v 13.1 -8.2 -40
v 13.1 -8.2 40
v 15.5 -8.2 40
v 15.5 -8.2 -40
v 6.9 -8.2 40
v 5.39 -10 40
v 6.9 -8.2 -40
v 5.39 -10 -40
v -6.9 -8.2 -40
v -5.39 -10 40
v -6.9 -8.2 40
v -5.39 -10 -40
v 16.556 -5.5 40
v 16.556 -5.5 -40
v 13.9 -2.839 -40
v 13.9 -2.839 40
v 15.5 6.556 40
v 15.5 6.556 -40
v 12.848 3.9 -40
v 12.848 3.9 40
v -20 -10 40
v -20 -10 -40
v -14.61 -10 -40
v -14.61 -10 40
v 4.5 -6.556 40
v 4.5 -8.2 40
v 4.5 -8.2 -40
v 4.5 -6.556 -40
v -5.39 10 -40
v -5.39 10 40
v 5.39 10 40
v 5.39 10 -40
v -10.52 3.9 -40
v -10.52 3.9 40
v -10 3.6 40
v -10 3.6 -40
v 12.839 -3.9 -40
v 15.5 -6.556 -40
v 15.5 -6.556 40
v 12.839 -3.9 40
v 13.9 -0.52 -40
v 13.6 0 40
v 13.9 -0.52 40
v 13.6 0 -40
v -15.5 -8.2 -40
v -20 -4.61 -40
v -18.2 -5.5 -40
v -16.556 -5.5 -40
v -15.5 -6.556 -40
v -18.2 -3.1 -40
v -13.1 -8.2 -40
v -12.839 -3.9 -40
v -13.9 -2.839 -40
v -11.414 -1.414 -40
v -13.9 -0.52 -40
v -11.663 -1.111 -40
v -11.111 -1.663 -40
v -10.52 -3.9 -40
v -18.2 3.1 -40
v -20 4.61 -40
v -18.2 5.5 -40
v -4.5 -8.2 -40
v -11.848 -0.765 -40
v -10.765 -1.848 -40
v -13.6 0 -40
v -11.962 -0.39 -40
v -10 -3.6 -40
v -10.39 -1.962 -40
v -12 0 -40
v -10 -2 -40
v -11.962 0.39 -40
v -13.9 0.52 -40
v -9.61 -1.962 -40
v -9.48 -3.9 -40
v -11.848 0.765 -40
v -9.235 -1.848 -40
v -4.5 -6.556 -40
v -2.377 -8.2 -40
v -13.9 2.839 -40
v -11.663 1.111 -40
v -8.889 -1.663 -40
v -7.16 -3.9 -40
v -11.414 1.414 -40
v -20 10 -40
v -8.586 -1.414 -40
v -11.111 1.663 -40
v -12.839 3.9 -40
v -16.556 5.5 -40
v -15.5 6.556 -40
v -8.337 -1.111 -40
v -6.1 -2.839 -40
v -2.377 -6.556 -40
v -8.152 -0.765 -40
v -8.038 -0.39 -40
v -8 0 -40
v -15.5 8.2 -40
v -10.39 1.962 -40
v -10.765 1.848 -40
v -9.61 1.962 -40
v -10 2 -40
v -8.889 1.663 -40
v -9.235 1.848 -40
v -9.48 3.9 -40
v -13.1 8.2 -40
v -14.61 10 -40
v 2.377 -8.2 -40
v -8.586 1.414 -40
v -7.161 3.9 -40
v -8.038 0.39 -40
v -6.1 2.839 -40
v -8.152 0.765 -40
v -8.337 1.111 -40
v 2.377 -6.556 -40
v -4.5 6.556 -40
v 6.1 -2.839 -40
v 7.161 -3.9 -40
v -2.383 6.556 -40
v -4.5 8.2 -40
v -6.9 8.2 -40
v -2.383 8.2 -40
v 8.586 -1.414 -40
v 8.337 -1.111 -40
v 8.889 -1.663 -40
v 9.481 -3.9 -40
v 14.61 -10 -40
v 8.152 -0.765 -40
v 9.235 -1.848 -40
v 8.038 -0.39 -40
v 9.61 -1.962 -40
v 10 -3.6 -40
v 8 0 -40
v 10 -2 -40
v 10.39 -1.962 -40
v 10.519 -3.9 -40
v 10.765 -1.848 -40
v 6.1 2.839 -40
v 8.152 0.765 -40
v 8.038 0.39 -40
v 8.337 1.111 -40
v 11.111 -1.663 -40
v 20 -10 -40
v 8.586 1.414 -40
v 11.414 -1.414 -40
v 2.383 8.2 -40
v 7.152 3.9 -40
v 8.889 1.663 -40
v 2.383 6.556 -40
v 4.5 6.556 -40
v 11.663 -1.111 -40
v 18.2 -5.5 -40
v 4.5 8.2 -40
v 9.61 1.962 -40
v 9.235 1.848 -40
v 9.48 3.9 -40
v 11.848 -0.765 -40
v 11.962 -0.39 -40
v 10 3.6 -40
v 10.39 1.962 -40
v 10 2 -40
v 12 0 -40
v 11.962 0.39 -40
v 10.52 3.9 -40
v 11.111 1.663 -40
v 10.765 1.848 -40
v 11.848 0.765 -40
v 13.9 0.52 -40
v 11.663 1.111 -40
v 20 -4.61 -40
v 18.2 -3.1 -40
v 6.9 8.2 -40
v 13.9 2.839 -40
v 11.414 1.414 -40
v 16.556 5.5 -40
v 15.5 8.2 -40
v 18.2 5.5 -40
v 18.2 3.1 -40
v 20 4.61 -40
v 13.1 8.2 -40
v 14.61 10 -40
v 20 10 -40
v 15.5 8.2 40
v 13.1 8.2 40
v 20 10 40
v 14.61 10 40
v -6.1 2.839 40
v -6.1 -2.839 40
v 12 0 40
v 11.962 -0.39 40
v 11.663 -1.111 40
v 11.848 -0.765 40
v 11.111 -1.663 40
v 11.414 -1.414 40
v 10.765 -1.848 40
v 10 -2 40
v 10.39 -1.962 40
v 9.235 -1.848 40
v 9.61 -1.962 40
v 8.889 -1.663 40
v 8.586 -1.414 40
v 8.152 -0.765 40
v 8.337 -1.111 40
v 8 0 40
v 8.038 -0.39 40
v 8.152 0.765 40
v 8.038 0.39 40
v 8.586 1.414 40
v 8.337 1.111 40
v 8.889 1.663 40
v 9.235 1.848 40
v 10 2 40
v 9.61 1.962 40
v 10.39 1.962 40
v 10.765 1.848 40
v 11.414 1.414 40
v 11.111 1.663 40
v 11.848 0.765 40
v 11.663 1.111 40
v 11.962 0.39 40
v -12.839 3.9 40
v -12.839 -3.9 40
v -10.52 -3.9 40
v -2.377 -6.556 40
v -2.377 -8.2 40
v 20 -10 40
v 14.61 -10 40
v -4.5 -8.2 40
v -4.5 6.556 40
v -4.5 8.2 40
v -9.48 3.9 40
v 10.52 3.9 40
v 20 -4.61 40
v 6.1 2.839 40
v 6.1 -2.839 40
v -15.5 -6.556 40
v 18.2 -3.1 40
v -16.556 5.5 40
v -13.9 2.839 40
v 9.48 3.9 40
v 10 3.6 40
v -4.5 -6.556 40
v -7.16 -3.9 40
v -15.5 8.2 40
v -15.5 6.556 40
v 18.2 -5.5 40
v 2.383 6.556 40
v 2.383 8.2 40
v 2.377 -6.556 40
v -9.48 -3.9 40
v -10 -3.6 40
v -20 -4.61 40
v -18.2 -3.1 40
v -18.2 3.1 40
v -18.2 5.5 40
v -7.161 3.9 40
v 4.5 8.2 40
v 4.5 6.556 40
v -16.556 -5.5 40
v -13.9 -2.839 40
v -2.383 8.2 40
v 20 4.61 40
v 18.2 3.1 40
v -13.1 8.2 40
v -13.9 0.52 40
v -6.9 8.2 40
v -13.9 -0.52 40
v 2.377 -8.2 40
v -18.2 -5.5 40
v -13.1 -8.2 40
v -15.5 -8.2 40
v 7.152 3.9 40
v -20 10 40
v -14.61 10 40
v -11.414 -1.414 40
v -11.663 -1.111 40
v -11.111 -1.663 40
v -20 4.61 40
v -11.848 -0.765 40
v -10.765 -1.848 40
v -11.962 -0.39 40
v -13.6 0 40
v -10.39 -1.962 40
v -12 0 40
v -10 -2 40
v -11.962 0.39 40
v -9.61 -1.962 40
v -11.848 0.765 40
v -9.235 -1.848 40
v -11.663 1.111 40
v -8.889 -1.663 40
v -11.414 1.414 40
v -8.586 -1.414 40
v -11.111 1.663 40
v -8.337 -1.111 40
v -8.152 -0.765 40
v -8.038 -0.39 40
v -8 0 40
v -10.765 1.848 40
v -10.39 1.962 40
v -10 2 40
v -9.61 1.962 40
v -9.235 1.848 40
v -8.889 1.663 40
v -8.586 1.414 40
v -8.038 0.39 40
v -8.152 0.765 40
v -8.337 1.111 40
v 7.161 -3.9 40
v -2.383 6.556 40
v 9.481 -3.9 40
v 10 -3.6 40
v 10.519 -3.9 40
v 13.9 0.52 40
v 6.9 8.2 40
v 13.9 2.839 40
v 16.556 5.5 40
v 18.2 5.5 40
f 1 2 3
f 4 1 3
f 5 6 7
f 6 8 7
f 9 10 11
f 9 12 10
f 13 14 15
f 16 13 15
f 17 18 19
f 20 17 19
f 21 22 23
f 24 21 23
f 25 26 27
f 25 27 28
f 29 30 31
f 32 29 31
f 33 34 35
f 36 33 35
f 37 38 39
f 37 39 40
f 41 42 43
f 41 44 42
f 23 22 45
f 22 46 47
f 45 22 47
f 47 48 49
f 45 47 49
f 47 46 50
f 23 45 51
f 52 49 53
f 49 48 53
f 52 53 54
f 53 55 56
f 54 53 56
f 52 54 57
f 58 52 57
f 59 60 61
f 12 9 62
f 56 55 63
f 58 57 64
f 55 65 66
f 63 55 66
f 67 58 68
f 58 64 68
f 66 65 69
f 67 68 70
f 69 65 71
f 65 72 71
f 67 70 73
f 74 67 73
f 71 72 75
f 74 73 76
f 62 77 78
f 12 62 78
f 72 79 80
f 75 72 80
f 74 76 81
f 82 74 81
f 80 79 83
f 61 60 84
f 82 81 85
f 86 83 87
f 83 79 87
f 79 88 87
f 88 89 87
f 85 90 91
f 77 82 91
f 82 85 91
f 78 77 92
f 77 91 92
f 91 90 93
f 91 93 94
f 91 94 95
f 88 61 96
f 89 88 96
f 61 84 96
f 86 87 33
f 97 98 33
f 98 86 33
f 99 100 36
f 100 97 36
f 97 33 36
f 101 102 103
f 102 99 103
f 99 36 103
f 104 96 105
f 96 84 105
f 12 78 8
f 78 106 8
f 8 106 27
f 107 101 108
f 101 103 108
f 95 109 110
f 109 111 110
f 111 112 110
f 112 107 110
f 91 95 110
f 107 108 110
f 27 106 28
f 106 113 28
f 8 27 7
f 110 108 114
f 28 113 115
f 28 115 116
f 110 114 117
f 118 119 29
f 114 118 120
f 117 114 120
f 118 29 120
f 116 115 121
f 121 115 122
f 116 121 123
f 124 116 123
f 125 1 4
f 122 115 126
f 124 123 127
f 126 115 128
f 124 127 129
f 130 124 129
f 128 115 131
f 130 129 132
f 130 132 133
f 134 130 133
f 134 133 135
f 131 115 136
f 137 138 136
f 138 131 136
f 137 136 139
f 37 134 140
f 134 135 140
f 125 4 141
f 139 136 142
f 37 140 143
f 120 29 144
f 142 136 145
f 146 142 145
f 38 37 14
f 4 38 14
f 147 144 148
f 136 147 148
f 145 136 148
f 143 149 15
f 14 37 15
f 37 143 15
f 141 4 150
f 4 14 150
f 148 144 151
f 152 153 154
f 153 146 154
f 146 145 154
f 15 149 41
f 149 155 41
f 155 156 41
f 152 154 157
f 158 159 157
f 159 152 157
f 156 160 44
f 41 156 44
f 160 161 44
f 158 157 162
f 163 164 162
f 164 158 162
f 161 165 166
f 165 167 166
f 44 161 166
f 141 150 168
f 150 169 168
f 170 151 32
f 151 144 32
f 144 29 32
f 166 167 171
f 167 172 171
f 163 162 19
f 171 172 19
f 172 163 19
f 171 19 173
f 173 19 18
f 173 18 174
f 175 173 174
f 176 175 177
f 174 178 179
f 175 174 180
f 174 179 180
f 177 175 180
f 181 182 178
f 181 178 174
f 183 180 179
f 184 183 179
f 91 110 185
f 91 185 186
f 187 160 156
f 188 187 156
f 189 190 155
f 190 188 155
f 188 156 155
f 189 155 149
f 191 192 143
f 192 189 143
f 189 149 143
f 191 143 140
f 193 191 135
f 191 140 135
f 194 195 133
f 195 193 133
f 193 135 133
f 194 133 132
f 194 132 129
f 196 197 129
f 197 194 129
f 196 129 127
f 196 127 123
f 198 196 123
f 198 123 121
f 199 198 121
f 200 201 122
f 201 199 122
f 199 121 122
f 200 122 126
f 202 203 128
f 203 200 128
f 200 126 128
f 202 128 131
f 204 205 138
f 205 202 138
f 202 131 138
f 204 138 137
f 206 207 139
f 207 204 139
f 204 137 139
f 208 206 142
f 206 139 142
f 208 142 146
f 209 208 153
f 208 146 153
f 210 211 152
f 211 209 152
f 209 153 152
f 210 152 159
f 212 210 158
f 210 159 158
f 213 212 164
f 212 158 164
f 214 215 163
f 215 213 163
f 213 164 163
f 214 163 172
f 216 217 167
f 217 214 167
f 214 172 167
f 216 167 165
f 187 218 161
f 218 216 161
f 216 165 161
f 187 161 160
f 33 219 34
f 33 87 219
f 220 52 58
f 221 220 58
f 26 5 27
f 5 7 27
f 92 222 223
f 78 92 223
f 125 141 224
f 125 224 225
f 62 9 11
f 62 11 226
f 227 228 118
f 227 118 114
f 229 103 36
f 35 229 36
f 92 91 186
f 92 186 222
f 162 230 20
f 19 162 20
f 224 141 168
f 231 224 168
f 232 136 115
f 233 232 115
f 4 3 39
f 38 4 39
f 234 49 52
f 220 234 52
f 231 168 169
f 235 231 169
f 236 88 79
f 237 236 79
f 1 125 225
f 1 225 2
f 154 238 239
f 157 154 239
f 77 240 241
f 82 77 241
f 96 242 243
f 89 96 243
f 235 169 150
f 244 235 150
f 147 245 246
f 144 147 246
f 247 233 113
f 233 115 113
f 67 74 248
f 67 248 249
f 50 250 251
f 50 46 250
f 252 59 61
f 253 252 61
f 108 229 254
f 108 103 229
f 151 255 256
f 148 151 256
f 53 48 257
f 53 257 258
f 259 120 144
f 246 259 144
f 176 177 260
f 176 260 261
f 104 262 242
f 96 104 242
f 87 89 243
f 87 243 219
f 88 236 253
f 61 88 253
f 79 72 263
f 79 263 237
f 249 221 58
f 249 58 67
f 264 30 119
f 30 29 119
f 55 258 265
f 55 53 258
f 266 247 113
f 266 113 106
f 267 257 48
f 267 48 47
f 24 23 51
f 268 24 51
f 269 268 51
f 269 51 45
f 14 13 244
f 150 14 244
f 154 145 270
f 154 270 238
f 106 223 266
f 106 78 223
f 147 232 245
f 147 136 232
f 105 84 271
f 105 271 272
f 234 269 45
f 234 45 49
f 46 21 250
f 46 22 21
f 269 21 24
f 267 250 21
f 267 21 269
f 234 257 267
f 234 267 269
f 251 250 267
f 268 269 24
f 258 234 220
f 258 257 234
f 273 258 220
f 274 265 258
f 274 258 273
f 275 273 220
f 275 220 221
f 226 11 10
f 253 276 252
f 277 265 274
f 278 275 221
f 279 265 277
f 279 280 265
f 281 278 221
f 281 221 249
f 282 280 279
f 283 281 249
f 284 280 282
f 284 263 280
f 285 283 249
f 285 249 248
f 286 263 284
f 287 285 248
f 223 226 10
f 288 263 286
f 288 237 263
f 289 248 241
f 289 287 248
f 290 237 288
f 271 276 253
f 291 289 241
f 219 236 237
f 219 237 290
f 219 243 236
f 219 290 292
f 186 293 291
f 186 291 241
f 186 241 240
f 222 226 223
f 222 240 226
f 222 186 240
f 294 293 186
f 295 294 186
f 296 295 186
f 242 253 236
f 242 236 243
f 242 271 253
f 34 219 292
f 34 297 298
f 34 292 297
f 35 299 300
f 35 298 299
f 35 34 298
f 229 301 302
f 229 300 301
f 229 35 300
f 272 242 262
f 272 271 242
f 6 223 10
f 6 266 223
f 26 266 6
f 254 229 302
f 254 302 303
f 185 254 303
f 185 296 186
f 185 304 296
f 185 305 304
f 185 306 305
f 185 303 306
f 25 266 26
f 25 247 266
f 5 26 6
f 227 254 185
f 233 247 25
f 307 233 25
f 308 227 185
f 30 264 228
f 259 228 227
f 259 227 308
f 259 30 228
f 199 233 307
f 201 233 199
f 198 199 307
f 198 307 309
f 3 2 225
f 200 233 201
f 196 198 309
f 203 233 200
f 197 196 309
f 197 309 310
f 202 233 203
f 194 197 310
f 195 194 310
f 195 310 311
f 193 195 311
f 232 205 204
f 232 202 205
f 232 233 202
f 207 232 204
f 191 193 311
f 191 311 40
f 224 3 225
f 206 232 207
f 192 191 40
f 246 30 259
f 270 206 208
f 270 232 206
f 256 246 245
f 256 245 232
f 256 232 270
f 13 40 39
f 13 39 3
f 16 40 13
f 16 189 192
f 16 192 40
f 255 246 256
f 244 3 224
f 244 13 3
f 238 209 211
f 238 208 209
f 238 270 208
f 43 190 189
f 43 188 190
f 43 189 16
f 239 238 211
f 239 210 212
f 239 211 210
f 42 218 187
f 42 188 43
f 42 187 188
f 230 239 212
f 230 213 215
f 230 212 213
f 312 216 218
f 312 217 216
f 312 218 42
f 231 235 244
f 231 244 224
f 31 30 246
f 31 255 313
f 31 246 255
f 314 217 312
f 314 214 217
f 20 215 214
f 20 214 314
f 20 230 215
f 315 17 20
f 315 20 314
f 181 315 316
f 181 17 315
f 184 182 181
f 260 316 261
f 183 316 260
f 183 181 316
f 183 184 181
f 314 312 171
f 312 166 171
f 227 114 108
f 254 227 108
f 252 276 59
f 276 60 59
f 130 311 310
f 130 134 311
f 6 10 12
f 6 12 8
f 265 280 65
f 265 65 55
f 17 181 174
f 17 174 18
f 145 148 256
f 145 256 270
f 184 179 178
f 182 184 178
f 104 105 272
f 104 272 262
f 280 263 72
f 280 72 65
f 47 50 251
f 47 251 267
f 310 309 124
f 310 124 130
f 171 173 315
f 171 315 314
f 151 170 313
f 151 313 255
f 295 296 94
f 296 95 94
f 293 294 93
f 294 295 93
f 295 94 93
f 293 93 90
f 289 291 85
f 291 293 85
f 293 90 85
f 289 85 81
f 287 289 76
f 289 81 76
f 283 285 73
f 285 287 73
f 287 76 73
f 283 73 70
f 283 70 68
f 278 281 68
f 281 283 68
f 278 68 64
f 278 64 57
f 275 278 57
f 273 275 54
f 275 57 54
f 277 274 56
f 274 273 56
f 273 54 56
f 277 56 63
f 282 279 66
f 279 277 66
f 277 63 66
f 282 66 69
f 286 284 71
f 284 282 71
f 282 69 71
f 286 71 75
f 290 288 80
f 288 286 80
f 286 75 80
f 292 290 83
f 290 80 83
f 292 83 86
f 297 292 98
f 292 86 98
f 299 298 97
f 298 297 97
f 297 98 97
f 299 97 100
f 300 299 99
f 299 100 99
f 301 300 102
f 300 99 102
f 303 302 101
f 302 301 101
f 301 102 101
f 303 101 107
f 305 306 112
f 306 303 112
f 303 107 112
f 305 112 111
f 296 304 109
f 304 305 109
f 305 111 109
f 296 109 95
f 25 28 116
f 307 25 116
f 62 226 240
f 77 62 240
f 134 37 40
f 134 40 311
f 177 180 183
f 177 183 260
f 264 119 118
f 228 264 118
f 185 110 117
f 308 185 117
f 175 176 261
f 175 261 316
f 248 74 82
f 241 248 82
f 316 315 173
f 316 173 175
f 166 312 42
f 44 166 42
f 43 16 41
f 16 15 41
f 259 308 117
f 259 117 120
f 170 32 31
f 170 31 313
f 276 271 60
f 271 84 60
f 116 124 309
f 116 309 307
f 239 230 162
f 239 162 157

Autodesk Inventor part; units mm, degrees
ref_plane "YZ Plane" through (0, 0, 0) normal (1, 0, 0) x (0, 1, 0)
ref_plane "XZ Plane" through (0, 0, 0) normal (0, 1, 0) x (-1, 0, 0)
ref_plane "XY Plane" through (0, 0, 0) normal (0, 0, 1) x (1, 0, 0)
sketch "Sketch1" plane through (0, 0, 0) normal (0, 0, 1) x (1, 0, 0)
  line L0 (4.5, 8.2) -> (4.5, 6.5562)
  line L1 (6.9, 8.2) -> (4.5, 8.2)
  line L2 (5.3896, 10) -> (6.9, 8.2)
  line L3 (-5.3896, 10) -> (5.3896, 10)
  line L4 (-5.3896, 10) -> (-6.9, 8.2)
  line L5 (-6.9, 8.2) -> (-4.5, 8.2)
  line L6 (-4.5, 8.2) -> (-4.5, 6.5562)
  line L7 (-4.5, 6.5562) -> (-7.1607, 3.9)
  line L8 (-9.4804, 3.8998) -> (-7.1607, 3.9)
  line L9 (-9.4804, 3.8998) -> (-10, 3.5998)
  line L10 (-10.5196, 3.8998) -> (-10, 3.5998)
  line L11 (-12.8393, 3.9) -> (-10.5196, 3.8998)
  line L12 (-15.5, 6.5562) -> (-12.8393, 3.9)
  line L13 (-15.5, 8.2) -> (-15.5, 6.5562)
  line L14 (-13.1, 8.2) -> (-15.5, 8.2)
  line L15 (-14.6104, 10) -> (-13.1, 8.2)
  line L16 (-20, 10) -> (-14.6104, 10)
  line L17 (-20, 10) -> (-20, 4.6104)
  line L18 (-20, 4.6104) -> (-18.2, 3.1)
  line L19 (-18.2, 3.1) -> (-18.2, 5.5)
  line L20 (-16.5562, 5.5) -> (-18.2, 5.5)
  line L21 (-16.5562, 5.5) -> (-13.9, 2.8393)
  line L22 (-13.9, 0.5196) -> (-13.9, 2.8393)
  line L23 (-13.9, 0.5196) -> (-13.6, 0)
  line L24 (-13.6, 0) -> (-13.9, -0.5196)
  line L25 (-13.9, -2.8393) -> (-13.9, -0.5196)
  line L26 (-16.5562, -5.5) -> (-13.9, -2.8393)
  line L27 (-16.5562, -5.5) -> (-18.2, -5.5)
  line L28 (-18.2, -3.1) -> (-18.2, -5.5)
  line L29 (-20, -4.6104) -> (-18.2, -3.1)
  line L30 (-20, -10) -> (-20, -4.6104)
  line L31 (-20, -10) -> (-14.6104, -10)
  line L32 (-14.6104, -10) -> (-13.1, -8.2)
  line L33 (-13.1, -8.2) -> (-15.5, -8.2)
  line L34 (-15.5, -8.2) -> (-15.5, -6.5562)
  line L35 (-15.5, -6.5562) -> (-12.8393, -3.9)
  line L36 (-12.8393, -3.9) -> (-10.5196, -3.9002)
  line L37 (-10.5196, -3.9002) -> (-10, -3.6002)
  line L38 (-9.4804, -3.9002) -> (-10, -3.6002)
  line L39 (-9.4804, -3.9002) -> (-7.1604, -3.9002)
  line L40 (-4.5, -6.5562) -> (-7.1604, -3.9002)
  line L41 (-4.5, -8.2) -> (-4.5, -6.5562)
  line L42 (-6.9, -8.2) -> (-4.5, -8.2)
  line L43 (-5.3896, -10) -> (-6.9, -8.2)
  line L44 (-5.3896, -10) -> (5.3896, -10)
  line L45 (5.3896, -10) -> (6.9, -8.2)
  line L46 (6.9, -8.2) -> (4.5, -8.2)
  line L47 (4.5, -8.2) -> (4.5, -6.5562)
  line L48 (4.5, -6.5562) -> (7.1607, -3.9)
  line L49 (9.4808, -3.9) -> (7.1607, -3.9)
  line L50 (9.4808, -3.9) -> (10, -3.6002)
  line L51 (10.5192, -3.9) -> (10, -3.6002)
  line L52 (12.8393, -3.9) -> (10.5192, -3.9)
  line L53 (15.5, -6.5562) -> (12.8393, -3.9)
  line L54 (15.5, -8.2) -> (15.5, -6.5562)
  line L55 (13.1, -8.2) -> (15.5, -8.2)
  line L56 (14.6104, -10) -> (13.1, -8.2)
  line L57 (20, -10) -> (14.6104, -10)
  line L58 (20, -10) -> (20, -4.6104)
  line L59 (20, -4.6104) -> (18.2, -3.1)
  line L60 (18.2, -3.1) -> (18.2, -5.5)
  line L61 (16.5562, -5.5) -> (18.2, -5.5)
  line L62 (16.5562, -5.5) -> (13.9, -2.8393)
  line L63 (13.9, -2.8393) -> (13.9, -0.5196)
  line L64 (13.6, 0) -> (13.9, -0.5196)
  line L65 (13.9, 0.5196) -> (13.6, 0)
  line L66 (13.9, 0.5196) -> (13.9, 2.8393)
  line L67 (16.5562, 5.5) -> (13.9, 2.8393)
  line L68 (16.5562, 5.5) -> (18.2, 5.5)
  line L69 (18.2, 3.1) -> (18.2, 5.5)
  line L70 (20, 4.6104) -> (18.2, 3.1)
  line L71 (20, 10) -> (20, 4.6104)
  line L72 (20, 10) -> (14.6104, 10)
  line L73 (14.6104, 10) -> (13.1, 8.2)
  line L74 (13.1, 8.2) -> (15.5, 8.2)
  line L75 (15.5, 8.2) -> (15.5, 6.5562)
  line L76 (15.5, 6.5562) -> (12.8481, 3.8998)
  line L77 (10.5196, 3.8998) -> (12.8481, 3.8998)
  line L78 (10.5196, 3.8998) -> (10, 3.5998)
  line L79 (9.4804, 3.8998) -> (10, 3.5998)
  line L80 (7.1519, 3.8998) -> (9.4804, 3.8998)
  line L81 (4.5, 6.5562) -> (7.1519, 3.8998)
  circle A0 centre (-10, 0) radius 2
  circle A1 centre (10, 0) radius 2
  line L82 (6.1, 2.8393) -> (2.3832, 6.5562)
  line L83 (6.1, 2.8393) -> (6.1, -2.8393)
  line L84 (6.1, -2.8393) -> (2.3769, -6.5562)
  line L85 (2.3769, -6.5562) -> (2.3769, -8.2)
  line L86 (-2.3769, -8.2) -> (2.3769, -8.2)
  line L87 (-2.3769, -6.5562) -> (-2.3769, -8.2)
  line L88 (-6.1, -2.8393) -> (-2.3769, -6.5562)
  line L89 (-6.1, 2.8393) -> (-6.1, -2.8393)
  line L90 (-6.1, 2.8393) -> (-2.3832, 6.5562)
  line L91 (-2.3832, 6.5562) -> (-2.3832, 8.2)
  line L92 (-2.3832, 8.2) -> (2.3832, 8.2)
  line L93 (2.3832, 6.5562) -> (2.3832, 8.2)
  point P0 (0, 0)
  point P1 (0, 0)
extrude "Extrusion1" add sketch "Sketch1" along normal mid plane 80
properties part number "vslot_2040_80mm"
